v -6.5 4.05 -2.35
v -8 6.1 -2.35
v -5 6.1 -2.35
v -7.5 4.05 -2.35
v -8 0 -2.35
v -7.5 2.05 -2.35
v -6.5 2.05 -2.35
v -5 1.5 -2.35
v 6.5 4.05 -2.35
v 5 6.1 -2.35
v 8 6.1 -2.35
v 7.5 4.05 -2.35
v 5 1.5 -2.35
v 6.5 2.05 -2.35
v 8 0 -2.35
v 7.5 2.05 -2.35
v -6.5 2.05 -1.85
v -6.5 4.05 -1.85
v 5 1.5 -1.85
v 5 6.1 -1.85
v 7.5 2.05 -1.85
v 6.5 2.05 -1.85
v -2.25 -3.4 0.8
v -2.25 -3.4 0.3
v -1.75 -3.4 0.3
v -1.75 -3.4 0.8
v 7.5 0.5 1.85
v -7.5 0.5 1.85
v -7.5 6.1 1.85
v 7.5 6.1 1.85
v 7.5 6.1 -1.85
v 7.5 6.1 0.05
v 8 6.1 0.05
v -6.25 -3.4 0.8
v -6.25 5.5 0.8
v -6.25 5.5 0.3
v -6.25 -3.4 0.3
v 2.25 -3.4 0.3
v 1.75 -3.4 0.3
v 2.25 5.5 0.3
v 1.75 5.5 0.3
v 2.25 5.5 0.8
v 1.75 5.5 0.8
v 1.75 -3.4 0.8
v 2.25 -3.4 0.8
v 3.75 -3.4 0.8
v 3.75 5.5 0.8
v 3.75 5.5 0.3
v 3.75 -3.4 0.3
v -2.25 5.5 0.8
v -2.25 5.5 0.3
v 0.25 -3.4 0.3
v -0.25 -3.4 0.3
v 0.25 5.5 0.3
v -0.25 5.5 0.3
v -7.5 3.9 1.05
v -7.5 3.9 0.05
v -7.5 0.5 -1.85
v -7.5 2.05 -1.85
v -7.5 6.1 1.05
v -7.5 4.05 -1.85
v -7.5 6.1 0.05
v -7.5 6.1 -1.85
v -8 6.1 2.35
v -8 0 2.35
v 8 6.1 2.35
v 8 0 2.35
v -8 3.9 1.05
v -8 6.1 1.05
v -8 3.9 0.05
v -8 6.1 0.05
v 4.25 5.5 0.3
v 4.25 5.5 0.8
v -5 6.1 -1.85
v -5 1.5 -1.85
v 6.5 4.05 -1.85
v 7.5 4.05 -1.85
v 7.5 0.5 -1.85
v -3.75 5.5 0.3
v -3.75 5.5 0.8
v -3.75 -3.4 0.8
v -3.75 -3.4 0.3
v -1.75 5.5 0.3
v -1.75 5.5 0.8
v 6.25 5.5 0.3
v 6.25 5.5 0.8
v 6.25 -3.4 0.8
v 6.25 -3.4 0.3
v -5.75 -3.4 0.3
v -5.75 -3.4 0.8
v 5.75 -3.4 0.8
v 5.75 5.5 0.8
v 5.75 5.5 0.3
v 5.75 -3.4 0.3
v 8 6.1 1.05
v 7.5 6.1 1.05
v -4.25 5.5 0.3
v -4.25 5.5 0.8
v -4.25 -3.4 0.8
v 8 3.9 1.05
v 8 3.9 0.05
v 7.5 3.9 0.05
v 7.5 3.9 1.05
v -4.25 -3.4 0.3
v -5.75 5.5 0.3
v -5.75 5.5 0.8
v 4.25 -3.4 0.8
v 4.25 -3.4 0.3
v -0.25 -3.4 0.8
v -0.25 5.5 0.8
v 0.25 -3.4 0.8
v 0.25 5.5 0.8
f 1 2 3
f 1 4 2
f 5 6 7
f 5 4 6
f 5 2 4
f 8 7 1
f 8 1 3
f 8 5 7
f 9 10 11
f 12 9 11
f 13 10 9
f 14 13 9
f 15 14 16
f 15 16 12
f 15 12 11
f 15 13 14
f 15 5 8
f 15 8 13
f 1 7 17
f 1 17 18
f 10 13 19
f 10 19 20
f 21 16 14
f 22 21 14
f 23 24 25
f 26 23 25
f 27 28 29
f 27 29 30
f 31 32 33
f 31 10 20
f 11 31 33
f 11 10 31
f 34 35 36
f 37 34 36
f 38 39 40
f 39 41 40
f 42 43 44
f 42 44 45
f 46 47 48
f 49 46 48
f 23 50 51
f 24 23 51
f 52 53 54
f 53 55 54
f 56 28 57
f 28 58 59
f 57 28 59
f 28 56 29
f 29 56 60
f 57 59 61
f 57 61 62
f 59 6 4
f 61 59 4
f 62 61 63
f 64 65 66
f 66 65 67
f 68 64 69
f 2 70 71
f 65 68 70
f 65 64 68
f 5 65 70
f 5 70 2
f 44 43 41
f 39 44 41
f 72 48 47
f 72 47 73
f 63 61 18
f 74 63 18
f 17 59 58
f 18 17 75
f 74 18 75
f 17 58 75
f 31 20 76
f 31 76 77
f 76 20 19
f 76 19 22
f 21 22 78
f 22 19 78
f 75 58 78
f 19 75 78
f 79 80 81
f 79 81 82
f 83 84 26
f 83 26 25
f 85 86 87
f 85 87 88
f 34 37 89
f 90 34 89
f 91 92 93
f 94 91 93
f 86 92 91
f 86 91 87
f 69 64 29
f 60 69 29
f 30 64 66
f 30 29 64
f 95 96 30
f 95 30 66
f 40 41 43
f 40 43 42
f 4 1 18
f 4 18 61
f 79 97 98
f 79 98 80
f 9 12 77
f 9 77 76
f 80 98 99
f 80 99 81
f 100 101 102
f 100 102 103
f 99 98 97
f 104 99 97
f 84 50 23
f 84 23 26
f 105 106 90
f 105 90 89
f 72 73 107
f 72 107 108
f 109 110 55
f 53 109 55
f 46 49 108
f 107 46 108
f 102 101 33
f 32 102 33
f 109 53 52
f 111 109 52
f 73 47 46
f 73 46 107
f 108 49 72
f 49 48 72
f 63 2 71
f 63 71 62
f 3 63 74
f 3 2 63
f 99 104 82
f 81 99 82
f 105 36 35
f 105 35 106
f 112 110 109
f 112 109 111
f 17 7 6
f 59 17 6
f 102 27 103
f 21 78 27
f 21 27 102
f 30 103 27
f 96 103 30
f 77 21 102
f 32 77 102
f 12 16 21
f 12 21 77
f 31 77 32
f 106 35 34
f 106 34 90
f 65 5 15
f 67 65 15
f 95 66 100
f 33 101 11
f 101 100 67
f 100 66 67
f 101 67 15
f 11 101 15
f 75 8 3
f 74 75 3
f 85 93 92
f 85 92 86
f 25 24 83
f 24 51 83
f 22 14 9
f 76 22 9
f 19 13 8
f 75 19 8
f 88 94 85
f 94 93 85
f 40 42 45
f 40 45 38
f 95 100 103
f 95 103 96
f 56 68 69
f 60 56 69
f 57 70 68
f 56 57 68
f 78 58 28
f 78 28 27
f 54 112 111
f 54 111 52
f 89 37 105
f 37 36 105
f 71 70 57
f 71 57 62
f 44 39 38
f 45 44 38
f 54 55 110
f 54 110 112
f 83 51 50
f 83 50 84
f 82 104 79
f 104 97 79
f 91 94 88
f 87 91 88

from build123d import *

# Parameters (mm, degrees)
SKETCH1_W         = 16
SKETCH1_H         = 4.7
CASING_DEPTH      = 6.1
CASING_SHELL_T    = -0.5
SKETCH2_W         = 0.5
SKETCH2_H         = 0.5
PINS_DEPTH        = 5
PINS_DEPTH_BACK   = 3.9
PINS_2_DEPTH      = 5
PINS_2_DEPTH_BACK = 3.9
PINS_3_DEPTH      = 5
PINS_3_DEPTH_BACK = 3.9
PINS_4_DEPTH      = 5
PINS_4_DEPTH_BACK = 3.9
PINS_5_DEPTH      = 5
PINS_5_DEPTH_BACK = 3.9
PINS_6_DEPTH      = 5
PINS_6_DEPTH_BACK = 3.9
PINS_7_DEPTH      = 5
PINS_7_DEPTH_BACK = 3.9
SKETCH3_W         = 10
SKETCH3_H         = 4.6
SKETCH3_W_2       = 1
SKETCH3_H_2       = 2
SHAPE_CUT1_DEPTH  = 0.5
SKETCH4_W         = 1
SKETCH4_H         = 2.2
SHAPE_CUT2_DEPTH  = 15.5


with BuildPart() as part:
    # Sketch1 → casing (new body)
    with BuildSketch(Plane(origin=(0, 0, 0), x_dir=(1, 0, 0), z_dir=(0, 1, 0))):
        Rectangle(SKETCH1_W, SKETCH1_H)
    extrude(amount=CASING_DEPTH)

    # casing_shell
    casing_shell_openings = [part.faces().sort_by_distance(p)[0] for p in [
        (0, 6.1, 0),
    ]]
    offset(amount=CASING_SHELL_T, openings=casing_shell_openings, kind=Kind.INTERSECTION)

    # Sketch3 → shape_cut1 (cut)
    with BuildSketch(Plane(origin=(0, 0, -2.35), x_dir=(-1, 0, 0), z_dir=(0, 0, -1))):
        with Locations((0, 3.8)):
            Rectangle(SKETCH3_W, SKETCH3_H)
        with Locations((-7, 3.05)):
            Rectangle(SKETCH3_W_2, SKETCH3_H_2)
        with Locations((7, 3.05)):
            Rectangle(SKETCH3_W_2, SKETCH3_H_2)
    extrude(amount=-SHAPE_CUT1_DEPTH, mode=Mode.SUBTRACT)

    # Sketch4 → shape_cut2 (cut)
    with BuildSketch(Plane.ZY.offset(8)):
        with Locations((0.55, 5)):
            Rectangle(SKETCH4_W, SKETCH4_H)
    shape_cut2 = extrude(amount=-SHAPE_CUT2_DEPTH, mode=Mode.SUBTRACT)

    # shape_cut2m: shape_cut2 across plane
    add(shape_cut2.mirror(Plane(origin=(0, 0, 0), x_dir=(0, 0, 1), z_dir=(1, 0, 0))), mode=Mode.SUBTRACT)


with BuildPart() as body_2:
    # Sketch2 → pins (new body, two sides)
    with BuildSketch(Plane(origin=(0, 0.5, 0), x_dir=(1, 0, 0), z_dir=(0, 1, 0))) as pins_sk:
        with Locations((-6, -0.55)):
            Rectangle(SKETCH2_W, SKETCH2_H)
    extrude(amount=PINS_DEPTH)
    extrude(pins_sk.sketch, amount=-PINS_DEPTH_BACK)


with BuildPart() as body_3:
    # Sketch2 → pins 2 (new body, two sides)
    with BuildSketch(Plane(origin=(0, 0.5, 0), x_dir=(1, 0, 0), z_dir=(0, 1, 0))) as pins_2_sk:
        with Locations((-4, -0.55)):
            Rectangle(SKETCH2_W, SKETCH2_H)
    extrude(amount=PINS_2_DEPTH)
    extrude(pins_2_sk.sketch, amount=-PINS_2_DEPTH_BACK)


with BuildPart() as body_4:
    # Sketch2 → pins 3 (new body, two sides)
    with BuildSketch(Plane(origin=(0, 0.5, 0), x_dir=(1, 0, 0), z_dir=(0, 1, 0))) as pins_3_sk:
        with Locations((-2, -0.55)):
            Rectangle(SKETCH2_W, SKETCH2_H)
    extrude(amount=PINS_3_DEPTH)
    extrude(pins_3_sk.sketch, amount=-PINS_3_DEPTH_BACK)


with BuildPart() as body_5:
    # Sketch2 → pins 4 (new body, two sides)
    with BuildSketch(Plane(origin=(0, 0.5, 0), x_dir=(1, 0, 0), z_dir=(0, 1, 0))) as pins_4_sk:
        with Locations((0, -0.55)):
            Rectangle(SKETCH2_W, SKETCH2_H)
    extrude(amount=PINS_4_DEPTH)
    extrude(pins_4_sk.sketch, amount=-PINS_4_DEPTH_BACK)


with BuildPart() as body_6:
    # Sketch2 → pins 5 (new body, two sides)
    with BuildSketch(Plane(origin=(0, 0.5, 0), x_dir=(1, 0, 0), z_dir=(0, 1, 0))) as pins_5_sk:
        with Locations((2, -0.55)):
            Rectangle(SKETCH2_W, SKETCH2_H)
    extrude(amount=PINS_5_DEPTH)
    extrude(pins_5_sk.sketch, amount=-PINS_5_DEPTH_BACK)


with BuildPart() as body_7:
    # Sketch2 → pins 6 (new body, two sides)
    with BuildSketch(Plane(origin=(0, 0.5, 0), x_dir=(1, 0, 0), z_dir=(0, 1, 0))) as pins_6_sk:
        with Locations((4, -0.55)):
            Rectangle(SKETCH2_W, SKETCH2_H)
    extrude(amount=PINS_6_DEPTH)
    extrude(pins_6_sk.sketch, amount=-PINS_6_DEPTH_BACK)


with BuildPart() as body_8:
    # Sketch2 → pins 7 (new body, two sides)
    with BuildSketch(Plane(origin=(0, 0.5, 0), x_dir=(1, 0, 0), z_dir=(0, 1, 0))) as pins_7_sk:
        with Locations((6, -0.55)):
            Rectangle(SKETCH2_W, SKETCH2_H)
    extrude(amount=PINS_7_DEPTH)
    extrude(pins_7_sk.sketch, amount=-PINS_7_DEPTH_BACK)


solid = Compound([part.part, body_2.part, body_3.part, body_4.part, body_5.part, body_6.part, body_7.part, body_8.part])
